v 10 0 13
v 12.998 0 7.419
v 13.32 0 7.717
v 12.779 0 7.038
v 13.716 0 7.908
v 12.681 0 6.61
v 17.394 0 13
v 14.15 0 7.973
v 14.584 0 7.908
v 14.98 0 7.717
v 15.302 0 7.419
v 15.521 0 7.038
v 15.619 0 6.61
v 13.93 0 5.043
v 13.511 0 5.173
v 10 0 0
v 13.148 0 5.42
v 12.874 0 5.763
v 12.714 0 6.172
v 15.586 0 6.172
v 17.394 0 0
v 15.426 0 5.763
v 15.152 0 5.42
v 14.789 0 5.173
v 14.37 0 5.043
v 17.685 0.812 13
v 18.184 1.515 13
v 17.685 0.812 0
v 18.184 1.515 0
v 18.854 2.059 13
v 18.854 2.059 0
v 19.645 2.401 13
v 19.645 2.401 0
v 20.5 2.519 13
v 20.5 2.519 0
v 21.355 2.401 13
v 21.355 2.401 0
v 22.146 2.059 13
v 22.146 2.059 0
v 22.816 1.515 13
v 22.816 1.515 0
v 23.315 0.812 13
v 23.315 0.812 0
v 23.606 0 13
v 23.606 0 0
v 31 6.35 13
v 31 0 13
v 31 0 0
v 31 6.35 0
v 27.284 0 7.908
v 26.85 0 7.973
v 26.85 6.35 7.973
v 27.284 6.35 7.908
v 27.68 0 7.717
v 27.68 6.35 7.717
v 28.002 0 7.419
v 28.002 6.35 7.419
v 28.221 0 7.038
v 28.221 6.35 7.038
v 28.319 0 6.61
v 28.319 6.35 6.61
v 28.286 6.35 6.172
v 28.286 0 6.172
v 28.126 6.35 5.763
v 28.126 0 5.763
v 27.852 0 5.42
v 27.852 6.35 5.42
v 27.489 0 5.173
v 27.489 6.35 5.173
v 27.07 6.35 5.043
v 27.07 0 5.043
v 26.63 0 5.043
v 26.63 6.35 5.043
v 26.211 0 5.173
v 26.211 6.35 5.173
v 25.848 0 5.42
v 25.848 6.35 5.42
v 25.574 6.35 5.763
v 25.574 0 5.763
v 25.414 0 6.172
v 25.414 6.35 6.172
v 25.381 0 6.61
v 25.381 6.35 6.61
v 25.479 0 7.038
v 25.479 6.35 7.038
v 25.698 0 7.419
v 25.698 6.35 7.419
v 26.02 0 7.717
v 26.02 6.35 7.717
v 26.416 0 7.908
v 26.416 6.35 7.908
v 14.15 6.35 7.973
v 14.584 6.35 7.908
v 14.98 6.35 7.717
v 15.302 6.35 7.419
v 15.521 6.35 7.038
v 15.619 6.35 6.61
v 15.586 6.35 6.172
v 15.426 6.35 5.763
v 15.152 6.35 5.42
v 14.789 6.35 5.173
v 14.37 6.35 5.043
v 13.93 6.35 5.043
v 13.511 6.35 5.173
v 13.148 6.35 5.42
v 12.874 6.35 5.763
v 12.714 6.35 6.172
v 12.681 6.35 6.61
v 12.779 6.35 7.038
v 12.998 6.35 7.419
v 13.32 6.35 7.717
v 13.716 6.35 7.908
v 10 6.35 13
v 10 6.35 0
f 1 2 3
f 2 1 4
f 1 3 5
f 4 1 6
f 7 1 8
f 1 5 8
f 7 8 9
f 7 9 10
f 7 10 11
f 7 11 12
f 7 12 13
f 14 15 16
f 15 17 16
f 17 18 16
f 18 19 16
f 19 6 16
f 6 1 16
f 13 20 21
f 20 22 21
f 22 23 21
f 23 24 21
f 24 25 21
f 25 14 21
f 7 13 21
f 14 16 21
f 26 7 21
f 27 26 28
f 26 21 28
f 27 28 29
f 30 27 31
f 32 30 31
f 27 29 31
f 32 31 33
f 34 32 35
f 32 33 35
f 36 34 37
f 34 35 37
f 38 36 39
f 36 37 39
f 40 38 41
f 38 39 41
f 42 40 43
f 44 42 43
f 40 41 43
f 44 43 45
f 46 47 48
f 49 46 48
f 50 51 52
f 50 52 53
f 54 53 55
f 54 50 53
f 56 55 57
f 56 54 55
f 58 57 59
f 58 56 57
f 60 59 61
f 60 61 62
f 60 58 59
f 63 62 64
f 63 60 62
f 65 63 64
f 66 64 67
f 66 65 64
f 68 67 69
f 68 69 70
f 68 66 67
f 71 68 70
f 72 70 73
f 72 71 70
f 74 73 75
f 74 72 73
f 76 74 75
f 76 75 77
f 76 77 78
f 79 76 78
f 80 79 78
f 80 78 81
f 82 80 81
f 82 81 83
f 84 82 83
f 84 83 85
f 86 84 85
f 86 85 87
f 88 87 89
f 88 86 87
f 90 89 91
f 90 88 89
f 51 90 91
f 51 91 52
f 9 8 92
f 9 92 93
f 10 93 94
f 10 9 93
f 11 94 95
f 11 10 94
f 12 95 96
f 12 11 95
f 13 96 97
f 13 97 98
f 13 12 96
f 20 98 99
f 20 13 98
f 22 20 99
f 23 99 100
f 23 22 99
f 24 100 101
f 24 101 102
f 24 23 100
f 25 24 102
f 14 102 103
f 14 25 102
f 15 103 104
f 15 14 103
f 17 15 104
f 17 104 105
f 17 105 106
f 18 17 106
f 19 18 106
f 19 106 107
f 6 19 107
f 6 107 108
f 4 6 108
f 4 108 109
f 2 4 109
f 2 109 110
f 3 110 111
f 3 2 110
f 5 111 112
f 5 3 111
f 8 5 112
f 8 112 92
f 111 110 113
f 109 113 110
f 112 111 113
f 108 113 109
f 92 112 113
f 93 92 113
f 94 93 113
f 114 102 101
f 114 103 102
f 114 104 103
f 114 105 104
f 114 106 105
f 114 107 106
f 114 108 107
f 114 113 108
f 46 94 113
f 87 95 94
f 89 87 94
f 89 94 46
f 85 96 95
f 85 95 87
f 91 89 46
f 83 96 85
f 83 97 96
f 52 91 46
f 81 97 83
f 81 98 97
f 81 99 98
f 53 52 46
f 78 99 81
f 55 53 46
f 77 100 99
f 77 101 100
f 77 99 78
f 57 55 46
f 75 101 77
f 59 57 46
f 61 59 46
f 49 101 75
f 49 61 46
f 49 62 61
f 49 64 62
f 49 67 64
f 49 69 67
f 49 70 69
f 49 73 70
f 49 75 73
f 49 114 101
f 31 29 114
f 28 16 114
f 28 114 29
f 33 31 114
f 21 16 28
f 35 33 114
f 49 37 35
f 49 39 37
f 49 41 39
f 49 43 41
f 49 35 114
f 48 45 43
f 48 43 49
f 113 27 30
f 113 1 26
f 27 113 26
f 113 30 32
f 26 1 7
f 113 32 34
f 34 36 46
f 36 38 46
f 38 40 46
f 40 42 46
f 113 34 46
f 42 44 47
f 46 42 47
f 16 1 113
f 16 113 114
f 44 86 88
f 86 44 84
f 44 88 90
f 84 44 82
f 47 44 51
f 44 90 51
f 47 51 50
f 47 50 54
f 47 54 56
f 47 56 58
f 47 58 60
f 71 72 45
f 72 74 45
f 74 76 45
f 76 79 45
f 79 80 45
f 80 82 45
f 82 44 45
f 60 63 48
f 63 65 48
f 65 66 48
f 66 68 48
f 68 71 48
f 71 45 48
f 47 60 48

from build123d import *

# Parameters (mm, degrees)
SKETCH1_W           = 21
SKETCH1_H           = 13
SKETCH1_R           = 1.4732
BOSS_EXTRUDE1_DEPTH = 6.35
CUT_EXTRUDE1_DEPTH  = 13


with BuildPart() as part:
    # Sketch1 → Boss-Extrude1 (new body)
    with BuildSketch(Plane(origin=(0, 0, 0), x_dir=(1, 0, 0), z_dir=(0, 1, 0))):
        with Locations((20.5, -6.5)):
            Rectangle(SKETCH1_W, SKETCH1_H)
        with Locations(Location((14.15, -6.5, 0), (0, 0, 270))):
            Circle(SKETCH1_R, mode=Mode.SUBTRACT)
        with Locations(Location((26.85, -6.5, 0), (0, 0, 270))):
            Circle(SKETCH1_R, mode=Mode.SUBTRACT)
    extrude(amount=BOSS_EXTRUDE1_DEPTH)

    # Sketch2 → Cut-Extrude1 (cut)
    with BuildSketch(Plane(origin=(0, 0, 0), x_dir=(-1, 0, 0), z_dir=(0, 0, -1))):
        with BuildLine():
            ThreePointArc((-17.39358, 0), (-20.5, 2.518661837), (-23.60642, 0))
            Line((-23.60642, 0), (-17.39358, 0))
        make_face()
        with BuildLine():
            Line((-17.39358, 0), (-23.60642, 0))
            ThreePointArc((-23.60642, 0), (-20.829955679, -3.814146619), (-17.325, -0.656338163))
            ThreePointArc((-17.325, -0.656338163), (-17.342191543, -0.326382484), (-17.39358, 0))
        make_face()
    extrude(amount=-CUT_EXTRUDE1_DEPTH, mode=Mode.SUBTRACT)


solid = part.part
